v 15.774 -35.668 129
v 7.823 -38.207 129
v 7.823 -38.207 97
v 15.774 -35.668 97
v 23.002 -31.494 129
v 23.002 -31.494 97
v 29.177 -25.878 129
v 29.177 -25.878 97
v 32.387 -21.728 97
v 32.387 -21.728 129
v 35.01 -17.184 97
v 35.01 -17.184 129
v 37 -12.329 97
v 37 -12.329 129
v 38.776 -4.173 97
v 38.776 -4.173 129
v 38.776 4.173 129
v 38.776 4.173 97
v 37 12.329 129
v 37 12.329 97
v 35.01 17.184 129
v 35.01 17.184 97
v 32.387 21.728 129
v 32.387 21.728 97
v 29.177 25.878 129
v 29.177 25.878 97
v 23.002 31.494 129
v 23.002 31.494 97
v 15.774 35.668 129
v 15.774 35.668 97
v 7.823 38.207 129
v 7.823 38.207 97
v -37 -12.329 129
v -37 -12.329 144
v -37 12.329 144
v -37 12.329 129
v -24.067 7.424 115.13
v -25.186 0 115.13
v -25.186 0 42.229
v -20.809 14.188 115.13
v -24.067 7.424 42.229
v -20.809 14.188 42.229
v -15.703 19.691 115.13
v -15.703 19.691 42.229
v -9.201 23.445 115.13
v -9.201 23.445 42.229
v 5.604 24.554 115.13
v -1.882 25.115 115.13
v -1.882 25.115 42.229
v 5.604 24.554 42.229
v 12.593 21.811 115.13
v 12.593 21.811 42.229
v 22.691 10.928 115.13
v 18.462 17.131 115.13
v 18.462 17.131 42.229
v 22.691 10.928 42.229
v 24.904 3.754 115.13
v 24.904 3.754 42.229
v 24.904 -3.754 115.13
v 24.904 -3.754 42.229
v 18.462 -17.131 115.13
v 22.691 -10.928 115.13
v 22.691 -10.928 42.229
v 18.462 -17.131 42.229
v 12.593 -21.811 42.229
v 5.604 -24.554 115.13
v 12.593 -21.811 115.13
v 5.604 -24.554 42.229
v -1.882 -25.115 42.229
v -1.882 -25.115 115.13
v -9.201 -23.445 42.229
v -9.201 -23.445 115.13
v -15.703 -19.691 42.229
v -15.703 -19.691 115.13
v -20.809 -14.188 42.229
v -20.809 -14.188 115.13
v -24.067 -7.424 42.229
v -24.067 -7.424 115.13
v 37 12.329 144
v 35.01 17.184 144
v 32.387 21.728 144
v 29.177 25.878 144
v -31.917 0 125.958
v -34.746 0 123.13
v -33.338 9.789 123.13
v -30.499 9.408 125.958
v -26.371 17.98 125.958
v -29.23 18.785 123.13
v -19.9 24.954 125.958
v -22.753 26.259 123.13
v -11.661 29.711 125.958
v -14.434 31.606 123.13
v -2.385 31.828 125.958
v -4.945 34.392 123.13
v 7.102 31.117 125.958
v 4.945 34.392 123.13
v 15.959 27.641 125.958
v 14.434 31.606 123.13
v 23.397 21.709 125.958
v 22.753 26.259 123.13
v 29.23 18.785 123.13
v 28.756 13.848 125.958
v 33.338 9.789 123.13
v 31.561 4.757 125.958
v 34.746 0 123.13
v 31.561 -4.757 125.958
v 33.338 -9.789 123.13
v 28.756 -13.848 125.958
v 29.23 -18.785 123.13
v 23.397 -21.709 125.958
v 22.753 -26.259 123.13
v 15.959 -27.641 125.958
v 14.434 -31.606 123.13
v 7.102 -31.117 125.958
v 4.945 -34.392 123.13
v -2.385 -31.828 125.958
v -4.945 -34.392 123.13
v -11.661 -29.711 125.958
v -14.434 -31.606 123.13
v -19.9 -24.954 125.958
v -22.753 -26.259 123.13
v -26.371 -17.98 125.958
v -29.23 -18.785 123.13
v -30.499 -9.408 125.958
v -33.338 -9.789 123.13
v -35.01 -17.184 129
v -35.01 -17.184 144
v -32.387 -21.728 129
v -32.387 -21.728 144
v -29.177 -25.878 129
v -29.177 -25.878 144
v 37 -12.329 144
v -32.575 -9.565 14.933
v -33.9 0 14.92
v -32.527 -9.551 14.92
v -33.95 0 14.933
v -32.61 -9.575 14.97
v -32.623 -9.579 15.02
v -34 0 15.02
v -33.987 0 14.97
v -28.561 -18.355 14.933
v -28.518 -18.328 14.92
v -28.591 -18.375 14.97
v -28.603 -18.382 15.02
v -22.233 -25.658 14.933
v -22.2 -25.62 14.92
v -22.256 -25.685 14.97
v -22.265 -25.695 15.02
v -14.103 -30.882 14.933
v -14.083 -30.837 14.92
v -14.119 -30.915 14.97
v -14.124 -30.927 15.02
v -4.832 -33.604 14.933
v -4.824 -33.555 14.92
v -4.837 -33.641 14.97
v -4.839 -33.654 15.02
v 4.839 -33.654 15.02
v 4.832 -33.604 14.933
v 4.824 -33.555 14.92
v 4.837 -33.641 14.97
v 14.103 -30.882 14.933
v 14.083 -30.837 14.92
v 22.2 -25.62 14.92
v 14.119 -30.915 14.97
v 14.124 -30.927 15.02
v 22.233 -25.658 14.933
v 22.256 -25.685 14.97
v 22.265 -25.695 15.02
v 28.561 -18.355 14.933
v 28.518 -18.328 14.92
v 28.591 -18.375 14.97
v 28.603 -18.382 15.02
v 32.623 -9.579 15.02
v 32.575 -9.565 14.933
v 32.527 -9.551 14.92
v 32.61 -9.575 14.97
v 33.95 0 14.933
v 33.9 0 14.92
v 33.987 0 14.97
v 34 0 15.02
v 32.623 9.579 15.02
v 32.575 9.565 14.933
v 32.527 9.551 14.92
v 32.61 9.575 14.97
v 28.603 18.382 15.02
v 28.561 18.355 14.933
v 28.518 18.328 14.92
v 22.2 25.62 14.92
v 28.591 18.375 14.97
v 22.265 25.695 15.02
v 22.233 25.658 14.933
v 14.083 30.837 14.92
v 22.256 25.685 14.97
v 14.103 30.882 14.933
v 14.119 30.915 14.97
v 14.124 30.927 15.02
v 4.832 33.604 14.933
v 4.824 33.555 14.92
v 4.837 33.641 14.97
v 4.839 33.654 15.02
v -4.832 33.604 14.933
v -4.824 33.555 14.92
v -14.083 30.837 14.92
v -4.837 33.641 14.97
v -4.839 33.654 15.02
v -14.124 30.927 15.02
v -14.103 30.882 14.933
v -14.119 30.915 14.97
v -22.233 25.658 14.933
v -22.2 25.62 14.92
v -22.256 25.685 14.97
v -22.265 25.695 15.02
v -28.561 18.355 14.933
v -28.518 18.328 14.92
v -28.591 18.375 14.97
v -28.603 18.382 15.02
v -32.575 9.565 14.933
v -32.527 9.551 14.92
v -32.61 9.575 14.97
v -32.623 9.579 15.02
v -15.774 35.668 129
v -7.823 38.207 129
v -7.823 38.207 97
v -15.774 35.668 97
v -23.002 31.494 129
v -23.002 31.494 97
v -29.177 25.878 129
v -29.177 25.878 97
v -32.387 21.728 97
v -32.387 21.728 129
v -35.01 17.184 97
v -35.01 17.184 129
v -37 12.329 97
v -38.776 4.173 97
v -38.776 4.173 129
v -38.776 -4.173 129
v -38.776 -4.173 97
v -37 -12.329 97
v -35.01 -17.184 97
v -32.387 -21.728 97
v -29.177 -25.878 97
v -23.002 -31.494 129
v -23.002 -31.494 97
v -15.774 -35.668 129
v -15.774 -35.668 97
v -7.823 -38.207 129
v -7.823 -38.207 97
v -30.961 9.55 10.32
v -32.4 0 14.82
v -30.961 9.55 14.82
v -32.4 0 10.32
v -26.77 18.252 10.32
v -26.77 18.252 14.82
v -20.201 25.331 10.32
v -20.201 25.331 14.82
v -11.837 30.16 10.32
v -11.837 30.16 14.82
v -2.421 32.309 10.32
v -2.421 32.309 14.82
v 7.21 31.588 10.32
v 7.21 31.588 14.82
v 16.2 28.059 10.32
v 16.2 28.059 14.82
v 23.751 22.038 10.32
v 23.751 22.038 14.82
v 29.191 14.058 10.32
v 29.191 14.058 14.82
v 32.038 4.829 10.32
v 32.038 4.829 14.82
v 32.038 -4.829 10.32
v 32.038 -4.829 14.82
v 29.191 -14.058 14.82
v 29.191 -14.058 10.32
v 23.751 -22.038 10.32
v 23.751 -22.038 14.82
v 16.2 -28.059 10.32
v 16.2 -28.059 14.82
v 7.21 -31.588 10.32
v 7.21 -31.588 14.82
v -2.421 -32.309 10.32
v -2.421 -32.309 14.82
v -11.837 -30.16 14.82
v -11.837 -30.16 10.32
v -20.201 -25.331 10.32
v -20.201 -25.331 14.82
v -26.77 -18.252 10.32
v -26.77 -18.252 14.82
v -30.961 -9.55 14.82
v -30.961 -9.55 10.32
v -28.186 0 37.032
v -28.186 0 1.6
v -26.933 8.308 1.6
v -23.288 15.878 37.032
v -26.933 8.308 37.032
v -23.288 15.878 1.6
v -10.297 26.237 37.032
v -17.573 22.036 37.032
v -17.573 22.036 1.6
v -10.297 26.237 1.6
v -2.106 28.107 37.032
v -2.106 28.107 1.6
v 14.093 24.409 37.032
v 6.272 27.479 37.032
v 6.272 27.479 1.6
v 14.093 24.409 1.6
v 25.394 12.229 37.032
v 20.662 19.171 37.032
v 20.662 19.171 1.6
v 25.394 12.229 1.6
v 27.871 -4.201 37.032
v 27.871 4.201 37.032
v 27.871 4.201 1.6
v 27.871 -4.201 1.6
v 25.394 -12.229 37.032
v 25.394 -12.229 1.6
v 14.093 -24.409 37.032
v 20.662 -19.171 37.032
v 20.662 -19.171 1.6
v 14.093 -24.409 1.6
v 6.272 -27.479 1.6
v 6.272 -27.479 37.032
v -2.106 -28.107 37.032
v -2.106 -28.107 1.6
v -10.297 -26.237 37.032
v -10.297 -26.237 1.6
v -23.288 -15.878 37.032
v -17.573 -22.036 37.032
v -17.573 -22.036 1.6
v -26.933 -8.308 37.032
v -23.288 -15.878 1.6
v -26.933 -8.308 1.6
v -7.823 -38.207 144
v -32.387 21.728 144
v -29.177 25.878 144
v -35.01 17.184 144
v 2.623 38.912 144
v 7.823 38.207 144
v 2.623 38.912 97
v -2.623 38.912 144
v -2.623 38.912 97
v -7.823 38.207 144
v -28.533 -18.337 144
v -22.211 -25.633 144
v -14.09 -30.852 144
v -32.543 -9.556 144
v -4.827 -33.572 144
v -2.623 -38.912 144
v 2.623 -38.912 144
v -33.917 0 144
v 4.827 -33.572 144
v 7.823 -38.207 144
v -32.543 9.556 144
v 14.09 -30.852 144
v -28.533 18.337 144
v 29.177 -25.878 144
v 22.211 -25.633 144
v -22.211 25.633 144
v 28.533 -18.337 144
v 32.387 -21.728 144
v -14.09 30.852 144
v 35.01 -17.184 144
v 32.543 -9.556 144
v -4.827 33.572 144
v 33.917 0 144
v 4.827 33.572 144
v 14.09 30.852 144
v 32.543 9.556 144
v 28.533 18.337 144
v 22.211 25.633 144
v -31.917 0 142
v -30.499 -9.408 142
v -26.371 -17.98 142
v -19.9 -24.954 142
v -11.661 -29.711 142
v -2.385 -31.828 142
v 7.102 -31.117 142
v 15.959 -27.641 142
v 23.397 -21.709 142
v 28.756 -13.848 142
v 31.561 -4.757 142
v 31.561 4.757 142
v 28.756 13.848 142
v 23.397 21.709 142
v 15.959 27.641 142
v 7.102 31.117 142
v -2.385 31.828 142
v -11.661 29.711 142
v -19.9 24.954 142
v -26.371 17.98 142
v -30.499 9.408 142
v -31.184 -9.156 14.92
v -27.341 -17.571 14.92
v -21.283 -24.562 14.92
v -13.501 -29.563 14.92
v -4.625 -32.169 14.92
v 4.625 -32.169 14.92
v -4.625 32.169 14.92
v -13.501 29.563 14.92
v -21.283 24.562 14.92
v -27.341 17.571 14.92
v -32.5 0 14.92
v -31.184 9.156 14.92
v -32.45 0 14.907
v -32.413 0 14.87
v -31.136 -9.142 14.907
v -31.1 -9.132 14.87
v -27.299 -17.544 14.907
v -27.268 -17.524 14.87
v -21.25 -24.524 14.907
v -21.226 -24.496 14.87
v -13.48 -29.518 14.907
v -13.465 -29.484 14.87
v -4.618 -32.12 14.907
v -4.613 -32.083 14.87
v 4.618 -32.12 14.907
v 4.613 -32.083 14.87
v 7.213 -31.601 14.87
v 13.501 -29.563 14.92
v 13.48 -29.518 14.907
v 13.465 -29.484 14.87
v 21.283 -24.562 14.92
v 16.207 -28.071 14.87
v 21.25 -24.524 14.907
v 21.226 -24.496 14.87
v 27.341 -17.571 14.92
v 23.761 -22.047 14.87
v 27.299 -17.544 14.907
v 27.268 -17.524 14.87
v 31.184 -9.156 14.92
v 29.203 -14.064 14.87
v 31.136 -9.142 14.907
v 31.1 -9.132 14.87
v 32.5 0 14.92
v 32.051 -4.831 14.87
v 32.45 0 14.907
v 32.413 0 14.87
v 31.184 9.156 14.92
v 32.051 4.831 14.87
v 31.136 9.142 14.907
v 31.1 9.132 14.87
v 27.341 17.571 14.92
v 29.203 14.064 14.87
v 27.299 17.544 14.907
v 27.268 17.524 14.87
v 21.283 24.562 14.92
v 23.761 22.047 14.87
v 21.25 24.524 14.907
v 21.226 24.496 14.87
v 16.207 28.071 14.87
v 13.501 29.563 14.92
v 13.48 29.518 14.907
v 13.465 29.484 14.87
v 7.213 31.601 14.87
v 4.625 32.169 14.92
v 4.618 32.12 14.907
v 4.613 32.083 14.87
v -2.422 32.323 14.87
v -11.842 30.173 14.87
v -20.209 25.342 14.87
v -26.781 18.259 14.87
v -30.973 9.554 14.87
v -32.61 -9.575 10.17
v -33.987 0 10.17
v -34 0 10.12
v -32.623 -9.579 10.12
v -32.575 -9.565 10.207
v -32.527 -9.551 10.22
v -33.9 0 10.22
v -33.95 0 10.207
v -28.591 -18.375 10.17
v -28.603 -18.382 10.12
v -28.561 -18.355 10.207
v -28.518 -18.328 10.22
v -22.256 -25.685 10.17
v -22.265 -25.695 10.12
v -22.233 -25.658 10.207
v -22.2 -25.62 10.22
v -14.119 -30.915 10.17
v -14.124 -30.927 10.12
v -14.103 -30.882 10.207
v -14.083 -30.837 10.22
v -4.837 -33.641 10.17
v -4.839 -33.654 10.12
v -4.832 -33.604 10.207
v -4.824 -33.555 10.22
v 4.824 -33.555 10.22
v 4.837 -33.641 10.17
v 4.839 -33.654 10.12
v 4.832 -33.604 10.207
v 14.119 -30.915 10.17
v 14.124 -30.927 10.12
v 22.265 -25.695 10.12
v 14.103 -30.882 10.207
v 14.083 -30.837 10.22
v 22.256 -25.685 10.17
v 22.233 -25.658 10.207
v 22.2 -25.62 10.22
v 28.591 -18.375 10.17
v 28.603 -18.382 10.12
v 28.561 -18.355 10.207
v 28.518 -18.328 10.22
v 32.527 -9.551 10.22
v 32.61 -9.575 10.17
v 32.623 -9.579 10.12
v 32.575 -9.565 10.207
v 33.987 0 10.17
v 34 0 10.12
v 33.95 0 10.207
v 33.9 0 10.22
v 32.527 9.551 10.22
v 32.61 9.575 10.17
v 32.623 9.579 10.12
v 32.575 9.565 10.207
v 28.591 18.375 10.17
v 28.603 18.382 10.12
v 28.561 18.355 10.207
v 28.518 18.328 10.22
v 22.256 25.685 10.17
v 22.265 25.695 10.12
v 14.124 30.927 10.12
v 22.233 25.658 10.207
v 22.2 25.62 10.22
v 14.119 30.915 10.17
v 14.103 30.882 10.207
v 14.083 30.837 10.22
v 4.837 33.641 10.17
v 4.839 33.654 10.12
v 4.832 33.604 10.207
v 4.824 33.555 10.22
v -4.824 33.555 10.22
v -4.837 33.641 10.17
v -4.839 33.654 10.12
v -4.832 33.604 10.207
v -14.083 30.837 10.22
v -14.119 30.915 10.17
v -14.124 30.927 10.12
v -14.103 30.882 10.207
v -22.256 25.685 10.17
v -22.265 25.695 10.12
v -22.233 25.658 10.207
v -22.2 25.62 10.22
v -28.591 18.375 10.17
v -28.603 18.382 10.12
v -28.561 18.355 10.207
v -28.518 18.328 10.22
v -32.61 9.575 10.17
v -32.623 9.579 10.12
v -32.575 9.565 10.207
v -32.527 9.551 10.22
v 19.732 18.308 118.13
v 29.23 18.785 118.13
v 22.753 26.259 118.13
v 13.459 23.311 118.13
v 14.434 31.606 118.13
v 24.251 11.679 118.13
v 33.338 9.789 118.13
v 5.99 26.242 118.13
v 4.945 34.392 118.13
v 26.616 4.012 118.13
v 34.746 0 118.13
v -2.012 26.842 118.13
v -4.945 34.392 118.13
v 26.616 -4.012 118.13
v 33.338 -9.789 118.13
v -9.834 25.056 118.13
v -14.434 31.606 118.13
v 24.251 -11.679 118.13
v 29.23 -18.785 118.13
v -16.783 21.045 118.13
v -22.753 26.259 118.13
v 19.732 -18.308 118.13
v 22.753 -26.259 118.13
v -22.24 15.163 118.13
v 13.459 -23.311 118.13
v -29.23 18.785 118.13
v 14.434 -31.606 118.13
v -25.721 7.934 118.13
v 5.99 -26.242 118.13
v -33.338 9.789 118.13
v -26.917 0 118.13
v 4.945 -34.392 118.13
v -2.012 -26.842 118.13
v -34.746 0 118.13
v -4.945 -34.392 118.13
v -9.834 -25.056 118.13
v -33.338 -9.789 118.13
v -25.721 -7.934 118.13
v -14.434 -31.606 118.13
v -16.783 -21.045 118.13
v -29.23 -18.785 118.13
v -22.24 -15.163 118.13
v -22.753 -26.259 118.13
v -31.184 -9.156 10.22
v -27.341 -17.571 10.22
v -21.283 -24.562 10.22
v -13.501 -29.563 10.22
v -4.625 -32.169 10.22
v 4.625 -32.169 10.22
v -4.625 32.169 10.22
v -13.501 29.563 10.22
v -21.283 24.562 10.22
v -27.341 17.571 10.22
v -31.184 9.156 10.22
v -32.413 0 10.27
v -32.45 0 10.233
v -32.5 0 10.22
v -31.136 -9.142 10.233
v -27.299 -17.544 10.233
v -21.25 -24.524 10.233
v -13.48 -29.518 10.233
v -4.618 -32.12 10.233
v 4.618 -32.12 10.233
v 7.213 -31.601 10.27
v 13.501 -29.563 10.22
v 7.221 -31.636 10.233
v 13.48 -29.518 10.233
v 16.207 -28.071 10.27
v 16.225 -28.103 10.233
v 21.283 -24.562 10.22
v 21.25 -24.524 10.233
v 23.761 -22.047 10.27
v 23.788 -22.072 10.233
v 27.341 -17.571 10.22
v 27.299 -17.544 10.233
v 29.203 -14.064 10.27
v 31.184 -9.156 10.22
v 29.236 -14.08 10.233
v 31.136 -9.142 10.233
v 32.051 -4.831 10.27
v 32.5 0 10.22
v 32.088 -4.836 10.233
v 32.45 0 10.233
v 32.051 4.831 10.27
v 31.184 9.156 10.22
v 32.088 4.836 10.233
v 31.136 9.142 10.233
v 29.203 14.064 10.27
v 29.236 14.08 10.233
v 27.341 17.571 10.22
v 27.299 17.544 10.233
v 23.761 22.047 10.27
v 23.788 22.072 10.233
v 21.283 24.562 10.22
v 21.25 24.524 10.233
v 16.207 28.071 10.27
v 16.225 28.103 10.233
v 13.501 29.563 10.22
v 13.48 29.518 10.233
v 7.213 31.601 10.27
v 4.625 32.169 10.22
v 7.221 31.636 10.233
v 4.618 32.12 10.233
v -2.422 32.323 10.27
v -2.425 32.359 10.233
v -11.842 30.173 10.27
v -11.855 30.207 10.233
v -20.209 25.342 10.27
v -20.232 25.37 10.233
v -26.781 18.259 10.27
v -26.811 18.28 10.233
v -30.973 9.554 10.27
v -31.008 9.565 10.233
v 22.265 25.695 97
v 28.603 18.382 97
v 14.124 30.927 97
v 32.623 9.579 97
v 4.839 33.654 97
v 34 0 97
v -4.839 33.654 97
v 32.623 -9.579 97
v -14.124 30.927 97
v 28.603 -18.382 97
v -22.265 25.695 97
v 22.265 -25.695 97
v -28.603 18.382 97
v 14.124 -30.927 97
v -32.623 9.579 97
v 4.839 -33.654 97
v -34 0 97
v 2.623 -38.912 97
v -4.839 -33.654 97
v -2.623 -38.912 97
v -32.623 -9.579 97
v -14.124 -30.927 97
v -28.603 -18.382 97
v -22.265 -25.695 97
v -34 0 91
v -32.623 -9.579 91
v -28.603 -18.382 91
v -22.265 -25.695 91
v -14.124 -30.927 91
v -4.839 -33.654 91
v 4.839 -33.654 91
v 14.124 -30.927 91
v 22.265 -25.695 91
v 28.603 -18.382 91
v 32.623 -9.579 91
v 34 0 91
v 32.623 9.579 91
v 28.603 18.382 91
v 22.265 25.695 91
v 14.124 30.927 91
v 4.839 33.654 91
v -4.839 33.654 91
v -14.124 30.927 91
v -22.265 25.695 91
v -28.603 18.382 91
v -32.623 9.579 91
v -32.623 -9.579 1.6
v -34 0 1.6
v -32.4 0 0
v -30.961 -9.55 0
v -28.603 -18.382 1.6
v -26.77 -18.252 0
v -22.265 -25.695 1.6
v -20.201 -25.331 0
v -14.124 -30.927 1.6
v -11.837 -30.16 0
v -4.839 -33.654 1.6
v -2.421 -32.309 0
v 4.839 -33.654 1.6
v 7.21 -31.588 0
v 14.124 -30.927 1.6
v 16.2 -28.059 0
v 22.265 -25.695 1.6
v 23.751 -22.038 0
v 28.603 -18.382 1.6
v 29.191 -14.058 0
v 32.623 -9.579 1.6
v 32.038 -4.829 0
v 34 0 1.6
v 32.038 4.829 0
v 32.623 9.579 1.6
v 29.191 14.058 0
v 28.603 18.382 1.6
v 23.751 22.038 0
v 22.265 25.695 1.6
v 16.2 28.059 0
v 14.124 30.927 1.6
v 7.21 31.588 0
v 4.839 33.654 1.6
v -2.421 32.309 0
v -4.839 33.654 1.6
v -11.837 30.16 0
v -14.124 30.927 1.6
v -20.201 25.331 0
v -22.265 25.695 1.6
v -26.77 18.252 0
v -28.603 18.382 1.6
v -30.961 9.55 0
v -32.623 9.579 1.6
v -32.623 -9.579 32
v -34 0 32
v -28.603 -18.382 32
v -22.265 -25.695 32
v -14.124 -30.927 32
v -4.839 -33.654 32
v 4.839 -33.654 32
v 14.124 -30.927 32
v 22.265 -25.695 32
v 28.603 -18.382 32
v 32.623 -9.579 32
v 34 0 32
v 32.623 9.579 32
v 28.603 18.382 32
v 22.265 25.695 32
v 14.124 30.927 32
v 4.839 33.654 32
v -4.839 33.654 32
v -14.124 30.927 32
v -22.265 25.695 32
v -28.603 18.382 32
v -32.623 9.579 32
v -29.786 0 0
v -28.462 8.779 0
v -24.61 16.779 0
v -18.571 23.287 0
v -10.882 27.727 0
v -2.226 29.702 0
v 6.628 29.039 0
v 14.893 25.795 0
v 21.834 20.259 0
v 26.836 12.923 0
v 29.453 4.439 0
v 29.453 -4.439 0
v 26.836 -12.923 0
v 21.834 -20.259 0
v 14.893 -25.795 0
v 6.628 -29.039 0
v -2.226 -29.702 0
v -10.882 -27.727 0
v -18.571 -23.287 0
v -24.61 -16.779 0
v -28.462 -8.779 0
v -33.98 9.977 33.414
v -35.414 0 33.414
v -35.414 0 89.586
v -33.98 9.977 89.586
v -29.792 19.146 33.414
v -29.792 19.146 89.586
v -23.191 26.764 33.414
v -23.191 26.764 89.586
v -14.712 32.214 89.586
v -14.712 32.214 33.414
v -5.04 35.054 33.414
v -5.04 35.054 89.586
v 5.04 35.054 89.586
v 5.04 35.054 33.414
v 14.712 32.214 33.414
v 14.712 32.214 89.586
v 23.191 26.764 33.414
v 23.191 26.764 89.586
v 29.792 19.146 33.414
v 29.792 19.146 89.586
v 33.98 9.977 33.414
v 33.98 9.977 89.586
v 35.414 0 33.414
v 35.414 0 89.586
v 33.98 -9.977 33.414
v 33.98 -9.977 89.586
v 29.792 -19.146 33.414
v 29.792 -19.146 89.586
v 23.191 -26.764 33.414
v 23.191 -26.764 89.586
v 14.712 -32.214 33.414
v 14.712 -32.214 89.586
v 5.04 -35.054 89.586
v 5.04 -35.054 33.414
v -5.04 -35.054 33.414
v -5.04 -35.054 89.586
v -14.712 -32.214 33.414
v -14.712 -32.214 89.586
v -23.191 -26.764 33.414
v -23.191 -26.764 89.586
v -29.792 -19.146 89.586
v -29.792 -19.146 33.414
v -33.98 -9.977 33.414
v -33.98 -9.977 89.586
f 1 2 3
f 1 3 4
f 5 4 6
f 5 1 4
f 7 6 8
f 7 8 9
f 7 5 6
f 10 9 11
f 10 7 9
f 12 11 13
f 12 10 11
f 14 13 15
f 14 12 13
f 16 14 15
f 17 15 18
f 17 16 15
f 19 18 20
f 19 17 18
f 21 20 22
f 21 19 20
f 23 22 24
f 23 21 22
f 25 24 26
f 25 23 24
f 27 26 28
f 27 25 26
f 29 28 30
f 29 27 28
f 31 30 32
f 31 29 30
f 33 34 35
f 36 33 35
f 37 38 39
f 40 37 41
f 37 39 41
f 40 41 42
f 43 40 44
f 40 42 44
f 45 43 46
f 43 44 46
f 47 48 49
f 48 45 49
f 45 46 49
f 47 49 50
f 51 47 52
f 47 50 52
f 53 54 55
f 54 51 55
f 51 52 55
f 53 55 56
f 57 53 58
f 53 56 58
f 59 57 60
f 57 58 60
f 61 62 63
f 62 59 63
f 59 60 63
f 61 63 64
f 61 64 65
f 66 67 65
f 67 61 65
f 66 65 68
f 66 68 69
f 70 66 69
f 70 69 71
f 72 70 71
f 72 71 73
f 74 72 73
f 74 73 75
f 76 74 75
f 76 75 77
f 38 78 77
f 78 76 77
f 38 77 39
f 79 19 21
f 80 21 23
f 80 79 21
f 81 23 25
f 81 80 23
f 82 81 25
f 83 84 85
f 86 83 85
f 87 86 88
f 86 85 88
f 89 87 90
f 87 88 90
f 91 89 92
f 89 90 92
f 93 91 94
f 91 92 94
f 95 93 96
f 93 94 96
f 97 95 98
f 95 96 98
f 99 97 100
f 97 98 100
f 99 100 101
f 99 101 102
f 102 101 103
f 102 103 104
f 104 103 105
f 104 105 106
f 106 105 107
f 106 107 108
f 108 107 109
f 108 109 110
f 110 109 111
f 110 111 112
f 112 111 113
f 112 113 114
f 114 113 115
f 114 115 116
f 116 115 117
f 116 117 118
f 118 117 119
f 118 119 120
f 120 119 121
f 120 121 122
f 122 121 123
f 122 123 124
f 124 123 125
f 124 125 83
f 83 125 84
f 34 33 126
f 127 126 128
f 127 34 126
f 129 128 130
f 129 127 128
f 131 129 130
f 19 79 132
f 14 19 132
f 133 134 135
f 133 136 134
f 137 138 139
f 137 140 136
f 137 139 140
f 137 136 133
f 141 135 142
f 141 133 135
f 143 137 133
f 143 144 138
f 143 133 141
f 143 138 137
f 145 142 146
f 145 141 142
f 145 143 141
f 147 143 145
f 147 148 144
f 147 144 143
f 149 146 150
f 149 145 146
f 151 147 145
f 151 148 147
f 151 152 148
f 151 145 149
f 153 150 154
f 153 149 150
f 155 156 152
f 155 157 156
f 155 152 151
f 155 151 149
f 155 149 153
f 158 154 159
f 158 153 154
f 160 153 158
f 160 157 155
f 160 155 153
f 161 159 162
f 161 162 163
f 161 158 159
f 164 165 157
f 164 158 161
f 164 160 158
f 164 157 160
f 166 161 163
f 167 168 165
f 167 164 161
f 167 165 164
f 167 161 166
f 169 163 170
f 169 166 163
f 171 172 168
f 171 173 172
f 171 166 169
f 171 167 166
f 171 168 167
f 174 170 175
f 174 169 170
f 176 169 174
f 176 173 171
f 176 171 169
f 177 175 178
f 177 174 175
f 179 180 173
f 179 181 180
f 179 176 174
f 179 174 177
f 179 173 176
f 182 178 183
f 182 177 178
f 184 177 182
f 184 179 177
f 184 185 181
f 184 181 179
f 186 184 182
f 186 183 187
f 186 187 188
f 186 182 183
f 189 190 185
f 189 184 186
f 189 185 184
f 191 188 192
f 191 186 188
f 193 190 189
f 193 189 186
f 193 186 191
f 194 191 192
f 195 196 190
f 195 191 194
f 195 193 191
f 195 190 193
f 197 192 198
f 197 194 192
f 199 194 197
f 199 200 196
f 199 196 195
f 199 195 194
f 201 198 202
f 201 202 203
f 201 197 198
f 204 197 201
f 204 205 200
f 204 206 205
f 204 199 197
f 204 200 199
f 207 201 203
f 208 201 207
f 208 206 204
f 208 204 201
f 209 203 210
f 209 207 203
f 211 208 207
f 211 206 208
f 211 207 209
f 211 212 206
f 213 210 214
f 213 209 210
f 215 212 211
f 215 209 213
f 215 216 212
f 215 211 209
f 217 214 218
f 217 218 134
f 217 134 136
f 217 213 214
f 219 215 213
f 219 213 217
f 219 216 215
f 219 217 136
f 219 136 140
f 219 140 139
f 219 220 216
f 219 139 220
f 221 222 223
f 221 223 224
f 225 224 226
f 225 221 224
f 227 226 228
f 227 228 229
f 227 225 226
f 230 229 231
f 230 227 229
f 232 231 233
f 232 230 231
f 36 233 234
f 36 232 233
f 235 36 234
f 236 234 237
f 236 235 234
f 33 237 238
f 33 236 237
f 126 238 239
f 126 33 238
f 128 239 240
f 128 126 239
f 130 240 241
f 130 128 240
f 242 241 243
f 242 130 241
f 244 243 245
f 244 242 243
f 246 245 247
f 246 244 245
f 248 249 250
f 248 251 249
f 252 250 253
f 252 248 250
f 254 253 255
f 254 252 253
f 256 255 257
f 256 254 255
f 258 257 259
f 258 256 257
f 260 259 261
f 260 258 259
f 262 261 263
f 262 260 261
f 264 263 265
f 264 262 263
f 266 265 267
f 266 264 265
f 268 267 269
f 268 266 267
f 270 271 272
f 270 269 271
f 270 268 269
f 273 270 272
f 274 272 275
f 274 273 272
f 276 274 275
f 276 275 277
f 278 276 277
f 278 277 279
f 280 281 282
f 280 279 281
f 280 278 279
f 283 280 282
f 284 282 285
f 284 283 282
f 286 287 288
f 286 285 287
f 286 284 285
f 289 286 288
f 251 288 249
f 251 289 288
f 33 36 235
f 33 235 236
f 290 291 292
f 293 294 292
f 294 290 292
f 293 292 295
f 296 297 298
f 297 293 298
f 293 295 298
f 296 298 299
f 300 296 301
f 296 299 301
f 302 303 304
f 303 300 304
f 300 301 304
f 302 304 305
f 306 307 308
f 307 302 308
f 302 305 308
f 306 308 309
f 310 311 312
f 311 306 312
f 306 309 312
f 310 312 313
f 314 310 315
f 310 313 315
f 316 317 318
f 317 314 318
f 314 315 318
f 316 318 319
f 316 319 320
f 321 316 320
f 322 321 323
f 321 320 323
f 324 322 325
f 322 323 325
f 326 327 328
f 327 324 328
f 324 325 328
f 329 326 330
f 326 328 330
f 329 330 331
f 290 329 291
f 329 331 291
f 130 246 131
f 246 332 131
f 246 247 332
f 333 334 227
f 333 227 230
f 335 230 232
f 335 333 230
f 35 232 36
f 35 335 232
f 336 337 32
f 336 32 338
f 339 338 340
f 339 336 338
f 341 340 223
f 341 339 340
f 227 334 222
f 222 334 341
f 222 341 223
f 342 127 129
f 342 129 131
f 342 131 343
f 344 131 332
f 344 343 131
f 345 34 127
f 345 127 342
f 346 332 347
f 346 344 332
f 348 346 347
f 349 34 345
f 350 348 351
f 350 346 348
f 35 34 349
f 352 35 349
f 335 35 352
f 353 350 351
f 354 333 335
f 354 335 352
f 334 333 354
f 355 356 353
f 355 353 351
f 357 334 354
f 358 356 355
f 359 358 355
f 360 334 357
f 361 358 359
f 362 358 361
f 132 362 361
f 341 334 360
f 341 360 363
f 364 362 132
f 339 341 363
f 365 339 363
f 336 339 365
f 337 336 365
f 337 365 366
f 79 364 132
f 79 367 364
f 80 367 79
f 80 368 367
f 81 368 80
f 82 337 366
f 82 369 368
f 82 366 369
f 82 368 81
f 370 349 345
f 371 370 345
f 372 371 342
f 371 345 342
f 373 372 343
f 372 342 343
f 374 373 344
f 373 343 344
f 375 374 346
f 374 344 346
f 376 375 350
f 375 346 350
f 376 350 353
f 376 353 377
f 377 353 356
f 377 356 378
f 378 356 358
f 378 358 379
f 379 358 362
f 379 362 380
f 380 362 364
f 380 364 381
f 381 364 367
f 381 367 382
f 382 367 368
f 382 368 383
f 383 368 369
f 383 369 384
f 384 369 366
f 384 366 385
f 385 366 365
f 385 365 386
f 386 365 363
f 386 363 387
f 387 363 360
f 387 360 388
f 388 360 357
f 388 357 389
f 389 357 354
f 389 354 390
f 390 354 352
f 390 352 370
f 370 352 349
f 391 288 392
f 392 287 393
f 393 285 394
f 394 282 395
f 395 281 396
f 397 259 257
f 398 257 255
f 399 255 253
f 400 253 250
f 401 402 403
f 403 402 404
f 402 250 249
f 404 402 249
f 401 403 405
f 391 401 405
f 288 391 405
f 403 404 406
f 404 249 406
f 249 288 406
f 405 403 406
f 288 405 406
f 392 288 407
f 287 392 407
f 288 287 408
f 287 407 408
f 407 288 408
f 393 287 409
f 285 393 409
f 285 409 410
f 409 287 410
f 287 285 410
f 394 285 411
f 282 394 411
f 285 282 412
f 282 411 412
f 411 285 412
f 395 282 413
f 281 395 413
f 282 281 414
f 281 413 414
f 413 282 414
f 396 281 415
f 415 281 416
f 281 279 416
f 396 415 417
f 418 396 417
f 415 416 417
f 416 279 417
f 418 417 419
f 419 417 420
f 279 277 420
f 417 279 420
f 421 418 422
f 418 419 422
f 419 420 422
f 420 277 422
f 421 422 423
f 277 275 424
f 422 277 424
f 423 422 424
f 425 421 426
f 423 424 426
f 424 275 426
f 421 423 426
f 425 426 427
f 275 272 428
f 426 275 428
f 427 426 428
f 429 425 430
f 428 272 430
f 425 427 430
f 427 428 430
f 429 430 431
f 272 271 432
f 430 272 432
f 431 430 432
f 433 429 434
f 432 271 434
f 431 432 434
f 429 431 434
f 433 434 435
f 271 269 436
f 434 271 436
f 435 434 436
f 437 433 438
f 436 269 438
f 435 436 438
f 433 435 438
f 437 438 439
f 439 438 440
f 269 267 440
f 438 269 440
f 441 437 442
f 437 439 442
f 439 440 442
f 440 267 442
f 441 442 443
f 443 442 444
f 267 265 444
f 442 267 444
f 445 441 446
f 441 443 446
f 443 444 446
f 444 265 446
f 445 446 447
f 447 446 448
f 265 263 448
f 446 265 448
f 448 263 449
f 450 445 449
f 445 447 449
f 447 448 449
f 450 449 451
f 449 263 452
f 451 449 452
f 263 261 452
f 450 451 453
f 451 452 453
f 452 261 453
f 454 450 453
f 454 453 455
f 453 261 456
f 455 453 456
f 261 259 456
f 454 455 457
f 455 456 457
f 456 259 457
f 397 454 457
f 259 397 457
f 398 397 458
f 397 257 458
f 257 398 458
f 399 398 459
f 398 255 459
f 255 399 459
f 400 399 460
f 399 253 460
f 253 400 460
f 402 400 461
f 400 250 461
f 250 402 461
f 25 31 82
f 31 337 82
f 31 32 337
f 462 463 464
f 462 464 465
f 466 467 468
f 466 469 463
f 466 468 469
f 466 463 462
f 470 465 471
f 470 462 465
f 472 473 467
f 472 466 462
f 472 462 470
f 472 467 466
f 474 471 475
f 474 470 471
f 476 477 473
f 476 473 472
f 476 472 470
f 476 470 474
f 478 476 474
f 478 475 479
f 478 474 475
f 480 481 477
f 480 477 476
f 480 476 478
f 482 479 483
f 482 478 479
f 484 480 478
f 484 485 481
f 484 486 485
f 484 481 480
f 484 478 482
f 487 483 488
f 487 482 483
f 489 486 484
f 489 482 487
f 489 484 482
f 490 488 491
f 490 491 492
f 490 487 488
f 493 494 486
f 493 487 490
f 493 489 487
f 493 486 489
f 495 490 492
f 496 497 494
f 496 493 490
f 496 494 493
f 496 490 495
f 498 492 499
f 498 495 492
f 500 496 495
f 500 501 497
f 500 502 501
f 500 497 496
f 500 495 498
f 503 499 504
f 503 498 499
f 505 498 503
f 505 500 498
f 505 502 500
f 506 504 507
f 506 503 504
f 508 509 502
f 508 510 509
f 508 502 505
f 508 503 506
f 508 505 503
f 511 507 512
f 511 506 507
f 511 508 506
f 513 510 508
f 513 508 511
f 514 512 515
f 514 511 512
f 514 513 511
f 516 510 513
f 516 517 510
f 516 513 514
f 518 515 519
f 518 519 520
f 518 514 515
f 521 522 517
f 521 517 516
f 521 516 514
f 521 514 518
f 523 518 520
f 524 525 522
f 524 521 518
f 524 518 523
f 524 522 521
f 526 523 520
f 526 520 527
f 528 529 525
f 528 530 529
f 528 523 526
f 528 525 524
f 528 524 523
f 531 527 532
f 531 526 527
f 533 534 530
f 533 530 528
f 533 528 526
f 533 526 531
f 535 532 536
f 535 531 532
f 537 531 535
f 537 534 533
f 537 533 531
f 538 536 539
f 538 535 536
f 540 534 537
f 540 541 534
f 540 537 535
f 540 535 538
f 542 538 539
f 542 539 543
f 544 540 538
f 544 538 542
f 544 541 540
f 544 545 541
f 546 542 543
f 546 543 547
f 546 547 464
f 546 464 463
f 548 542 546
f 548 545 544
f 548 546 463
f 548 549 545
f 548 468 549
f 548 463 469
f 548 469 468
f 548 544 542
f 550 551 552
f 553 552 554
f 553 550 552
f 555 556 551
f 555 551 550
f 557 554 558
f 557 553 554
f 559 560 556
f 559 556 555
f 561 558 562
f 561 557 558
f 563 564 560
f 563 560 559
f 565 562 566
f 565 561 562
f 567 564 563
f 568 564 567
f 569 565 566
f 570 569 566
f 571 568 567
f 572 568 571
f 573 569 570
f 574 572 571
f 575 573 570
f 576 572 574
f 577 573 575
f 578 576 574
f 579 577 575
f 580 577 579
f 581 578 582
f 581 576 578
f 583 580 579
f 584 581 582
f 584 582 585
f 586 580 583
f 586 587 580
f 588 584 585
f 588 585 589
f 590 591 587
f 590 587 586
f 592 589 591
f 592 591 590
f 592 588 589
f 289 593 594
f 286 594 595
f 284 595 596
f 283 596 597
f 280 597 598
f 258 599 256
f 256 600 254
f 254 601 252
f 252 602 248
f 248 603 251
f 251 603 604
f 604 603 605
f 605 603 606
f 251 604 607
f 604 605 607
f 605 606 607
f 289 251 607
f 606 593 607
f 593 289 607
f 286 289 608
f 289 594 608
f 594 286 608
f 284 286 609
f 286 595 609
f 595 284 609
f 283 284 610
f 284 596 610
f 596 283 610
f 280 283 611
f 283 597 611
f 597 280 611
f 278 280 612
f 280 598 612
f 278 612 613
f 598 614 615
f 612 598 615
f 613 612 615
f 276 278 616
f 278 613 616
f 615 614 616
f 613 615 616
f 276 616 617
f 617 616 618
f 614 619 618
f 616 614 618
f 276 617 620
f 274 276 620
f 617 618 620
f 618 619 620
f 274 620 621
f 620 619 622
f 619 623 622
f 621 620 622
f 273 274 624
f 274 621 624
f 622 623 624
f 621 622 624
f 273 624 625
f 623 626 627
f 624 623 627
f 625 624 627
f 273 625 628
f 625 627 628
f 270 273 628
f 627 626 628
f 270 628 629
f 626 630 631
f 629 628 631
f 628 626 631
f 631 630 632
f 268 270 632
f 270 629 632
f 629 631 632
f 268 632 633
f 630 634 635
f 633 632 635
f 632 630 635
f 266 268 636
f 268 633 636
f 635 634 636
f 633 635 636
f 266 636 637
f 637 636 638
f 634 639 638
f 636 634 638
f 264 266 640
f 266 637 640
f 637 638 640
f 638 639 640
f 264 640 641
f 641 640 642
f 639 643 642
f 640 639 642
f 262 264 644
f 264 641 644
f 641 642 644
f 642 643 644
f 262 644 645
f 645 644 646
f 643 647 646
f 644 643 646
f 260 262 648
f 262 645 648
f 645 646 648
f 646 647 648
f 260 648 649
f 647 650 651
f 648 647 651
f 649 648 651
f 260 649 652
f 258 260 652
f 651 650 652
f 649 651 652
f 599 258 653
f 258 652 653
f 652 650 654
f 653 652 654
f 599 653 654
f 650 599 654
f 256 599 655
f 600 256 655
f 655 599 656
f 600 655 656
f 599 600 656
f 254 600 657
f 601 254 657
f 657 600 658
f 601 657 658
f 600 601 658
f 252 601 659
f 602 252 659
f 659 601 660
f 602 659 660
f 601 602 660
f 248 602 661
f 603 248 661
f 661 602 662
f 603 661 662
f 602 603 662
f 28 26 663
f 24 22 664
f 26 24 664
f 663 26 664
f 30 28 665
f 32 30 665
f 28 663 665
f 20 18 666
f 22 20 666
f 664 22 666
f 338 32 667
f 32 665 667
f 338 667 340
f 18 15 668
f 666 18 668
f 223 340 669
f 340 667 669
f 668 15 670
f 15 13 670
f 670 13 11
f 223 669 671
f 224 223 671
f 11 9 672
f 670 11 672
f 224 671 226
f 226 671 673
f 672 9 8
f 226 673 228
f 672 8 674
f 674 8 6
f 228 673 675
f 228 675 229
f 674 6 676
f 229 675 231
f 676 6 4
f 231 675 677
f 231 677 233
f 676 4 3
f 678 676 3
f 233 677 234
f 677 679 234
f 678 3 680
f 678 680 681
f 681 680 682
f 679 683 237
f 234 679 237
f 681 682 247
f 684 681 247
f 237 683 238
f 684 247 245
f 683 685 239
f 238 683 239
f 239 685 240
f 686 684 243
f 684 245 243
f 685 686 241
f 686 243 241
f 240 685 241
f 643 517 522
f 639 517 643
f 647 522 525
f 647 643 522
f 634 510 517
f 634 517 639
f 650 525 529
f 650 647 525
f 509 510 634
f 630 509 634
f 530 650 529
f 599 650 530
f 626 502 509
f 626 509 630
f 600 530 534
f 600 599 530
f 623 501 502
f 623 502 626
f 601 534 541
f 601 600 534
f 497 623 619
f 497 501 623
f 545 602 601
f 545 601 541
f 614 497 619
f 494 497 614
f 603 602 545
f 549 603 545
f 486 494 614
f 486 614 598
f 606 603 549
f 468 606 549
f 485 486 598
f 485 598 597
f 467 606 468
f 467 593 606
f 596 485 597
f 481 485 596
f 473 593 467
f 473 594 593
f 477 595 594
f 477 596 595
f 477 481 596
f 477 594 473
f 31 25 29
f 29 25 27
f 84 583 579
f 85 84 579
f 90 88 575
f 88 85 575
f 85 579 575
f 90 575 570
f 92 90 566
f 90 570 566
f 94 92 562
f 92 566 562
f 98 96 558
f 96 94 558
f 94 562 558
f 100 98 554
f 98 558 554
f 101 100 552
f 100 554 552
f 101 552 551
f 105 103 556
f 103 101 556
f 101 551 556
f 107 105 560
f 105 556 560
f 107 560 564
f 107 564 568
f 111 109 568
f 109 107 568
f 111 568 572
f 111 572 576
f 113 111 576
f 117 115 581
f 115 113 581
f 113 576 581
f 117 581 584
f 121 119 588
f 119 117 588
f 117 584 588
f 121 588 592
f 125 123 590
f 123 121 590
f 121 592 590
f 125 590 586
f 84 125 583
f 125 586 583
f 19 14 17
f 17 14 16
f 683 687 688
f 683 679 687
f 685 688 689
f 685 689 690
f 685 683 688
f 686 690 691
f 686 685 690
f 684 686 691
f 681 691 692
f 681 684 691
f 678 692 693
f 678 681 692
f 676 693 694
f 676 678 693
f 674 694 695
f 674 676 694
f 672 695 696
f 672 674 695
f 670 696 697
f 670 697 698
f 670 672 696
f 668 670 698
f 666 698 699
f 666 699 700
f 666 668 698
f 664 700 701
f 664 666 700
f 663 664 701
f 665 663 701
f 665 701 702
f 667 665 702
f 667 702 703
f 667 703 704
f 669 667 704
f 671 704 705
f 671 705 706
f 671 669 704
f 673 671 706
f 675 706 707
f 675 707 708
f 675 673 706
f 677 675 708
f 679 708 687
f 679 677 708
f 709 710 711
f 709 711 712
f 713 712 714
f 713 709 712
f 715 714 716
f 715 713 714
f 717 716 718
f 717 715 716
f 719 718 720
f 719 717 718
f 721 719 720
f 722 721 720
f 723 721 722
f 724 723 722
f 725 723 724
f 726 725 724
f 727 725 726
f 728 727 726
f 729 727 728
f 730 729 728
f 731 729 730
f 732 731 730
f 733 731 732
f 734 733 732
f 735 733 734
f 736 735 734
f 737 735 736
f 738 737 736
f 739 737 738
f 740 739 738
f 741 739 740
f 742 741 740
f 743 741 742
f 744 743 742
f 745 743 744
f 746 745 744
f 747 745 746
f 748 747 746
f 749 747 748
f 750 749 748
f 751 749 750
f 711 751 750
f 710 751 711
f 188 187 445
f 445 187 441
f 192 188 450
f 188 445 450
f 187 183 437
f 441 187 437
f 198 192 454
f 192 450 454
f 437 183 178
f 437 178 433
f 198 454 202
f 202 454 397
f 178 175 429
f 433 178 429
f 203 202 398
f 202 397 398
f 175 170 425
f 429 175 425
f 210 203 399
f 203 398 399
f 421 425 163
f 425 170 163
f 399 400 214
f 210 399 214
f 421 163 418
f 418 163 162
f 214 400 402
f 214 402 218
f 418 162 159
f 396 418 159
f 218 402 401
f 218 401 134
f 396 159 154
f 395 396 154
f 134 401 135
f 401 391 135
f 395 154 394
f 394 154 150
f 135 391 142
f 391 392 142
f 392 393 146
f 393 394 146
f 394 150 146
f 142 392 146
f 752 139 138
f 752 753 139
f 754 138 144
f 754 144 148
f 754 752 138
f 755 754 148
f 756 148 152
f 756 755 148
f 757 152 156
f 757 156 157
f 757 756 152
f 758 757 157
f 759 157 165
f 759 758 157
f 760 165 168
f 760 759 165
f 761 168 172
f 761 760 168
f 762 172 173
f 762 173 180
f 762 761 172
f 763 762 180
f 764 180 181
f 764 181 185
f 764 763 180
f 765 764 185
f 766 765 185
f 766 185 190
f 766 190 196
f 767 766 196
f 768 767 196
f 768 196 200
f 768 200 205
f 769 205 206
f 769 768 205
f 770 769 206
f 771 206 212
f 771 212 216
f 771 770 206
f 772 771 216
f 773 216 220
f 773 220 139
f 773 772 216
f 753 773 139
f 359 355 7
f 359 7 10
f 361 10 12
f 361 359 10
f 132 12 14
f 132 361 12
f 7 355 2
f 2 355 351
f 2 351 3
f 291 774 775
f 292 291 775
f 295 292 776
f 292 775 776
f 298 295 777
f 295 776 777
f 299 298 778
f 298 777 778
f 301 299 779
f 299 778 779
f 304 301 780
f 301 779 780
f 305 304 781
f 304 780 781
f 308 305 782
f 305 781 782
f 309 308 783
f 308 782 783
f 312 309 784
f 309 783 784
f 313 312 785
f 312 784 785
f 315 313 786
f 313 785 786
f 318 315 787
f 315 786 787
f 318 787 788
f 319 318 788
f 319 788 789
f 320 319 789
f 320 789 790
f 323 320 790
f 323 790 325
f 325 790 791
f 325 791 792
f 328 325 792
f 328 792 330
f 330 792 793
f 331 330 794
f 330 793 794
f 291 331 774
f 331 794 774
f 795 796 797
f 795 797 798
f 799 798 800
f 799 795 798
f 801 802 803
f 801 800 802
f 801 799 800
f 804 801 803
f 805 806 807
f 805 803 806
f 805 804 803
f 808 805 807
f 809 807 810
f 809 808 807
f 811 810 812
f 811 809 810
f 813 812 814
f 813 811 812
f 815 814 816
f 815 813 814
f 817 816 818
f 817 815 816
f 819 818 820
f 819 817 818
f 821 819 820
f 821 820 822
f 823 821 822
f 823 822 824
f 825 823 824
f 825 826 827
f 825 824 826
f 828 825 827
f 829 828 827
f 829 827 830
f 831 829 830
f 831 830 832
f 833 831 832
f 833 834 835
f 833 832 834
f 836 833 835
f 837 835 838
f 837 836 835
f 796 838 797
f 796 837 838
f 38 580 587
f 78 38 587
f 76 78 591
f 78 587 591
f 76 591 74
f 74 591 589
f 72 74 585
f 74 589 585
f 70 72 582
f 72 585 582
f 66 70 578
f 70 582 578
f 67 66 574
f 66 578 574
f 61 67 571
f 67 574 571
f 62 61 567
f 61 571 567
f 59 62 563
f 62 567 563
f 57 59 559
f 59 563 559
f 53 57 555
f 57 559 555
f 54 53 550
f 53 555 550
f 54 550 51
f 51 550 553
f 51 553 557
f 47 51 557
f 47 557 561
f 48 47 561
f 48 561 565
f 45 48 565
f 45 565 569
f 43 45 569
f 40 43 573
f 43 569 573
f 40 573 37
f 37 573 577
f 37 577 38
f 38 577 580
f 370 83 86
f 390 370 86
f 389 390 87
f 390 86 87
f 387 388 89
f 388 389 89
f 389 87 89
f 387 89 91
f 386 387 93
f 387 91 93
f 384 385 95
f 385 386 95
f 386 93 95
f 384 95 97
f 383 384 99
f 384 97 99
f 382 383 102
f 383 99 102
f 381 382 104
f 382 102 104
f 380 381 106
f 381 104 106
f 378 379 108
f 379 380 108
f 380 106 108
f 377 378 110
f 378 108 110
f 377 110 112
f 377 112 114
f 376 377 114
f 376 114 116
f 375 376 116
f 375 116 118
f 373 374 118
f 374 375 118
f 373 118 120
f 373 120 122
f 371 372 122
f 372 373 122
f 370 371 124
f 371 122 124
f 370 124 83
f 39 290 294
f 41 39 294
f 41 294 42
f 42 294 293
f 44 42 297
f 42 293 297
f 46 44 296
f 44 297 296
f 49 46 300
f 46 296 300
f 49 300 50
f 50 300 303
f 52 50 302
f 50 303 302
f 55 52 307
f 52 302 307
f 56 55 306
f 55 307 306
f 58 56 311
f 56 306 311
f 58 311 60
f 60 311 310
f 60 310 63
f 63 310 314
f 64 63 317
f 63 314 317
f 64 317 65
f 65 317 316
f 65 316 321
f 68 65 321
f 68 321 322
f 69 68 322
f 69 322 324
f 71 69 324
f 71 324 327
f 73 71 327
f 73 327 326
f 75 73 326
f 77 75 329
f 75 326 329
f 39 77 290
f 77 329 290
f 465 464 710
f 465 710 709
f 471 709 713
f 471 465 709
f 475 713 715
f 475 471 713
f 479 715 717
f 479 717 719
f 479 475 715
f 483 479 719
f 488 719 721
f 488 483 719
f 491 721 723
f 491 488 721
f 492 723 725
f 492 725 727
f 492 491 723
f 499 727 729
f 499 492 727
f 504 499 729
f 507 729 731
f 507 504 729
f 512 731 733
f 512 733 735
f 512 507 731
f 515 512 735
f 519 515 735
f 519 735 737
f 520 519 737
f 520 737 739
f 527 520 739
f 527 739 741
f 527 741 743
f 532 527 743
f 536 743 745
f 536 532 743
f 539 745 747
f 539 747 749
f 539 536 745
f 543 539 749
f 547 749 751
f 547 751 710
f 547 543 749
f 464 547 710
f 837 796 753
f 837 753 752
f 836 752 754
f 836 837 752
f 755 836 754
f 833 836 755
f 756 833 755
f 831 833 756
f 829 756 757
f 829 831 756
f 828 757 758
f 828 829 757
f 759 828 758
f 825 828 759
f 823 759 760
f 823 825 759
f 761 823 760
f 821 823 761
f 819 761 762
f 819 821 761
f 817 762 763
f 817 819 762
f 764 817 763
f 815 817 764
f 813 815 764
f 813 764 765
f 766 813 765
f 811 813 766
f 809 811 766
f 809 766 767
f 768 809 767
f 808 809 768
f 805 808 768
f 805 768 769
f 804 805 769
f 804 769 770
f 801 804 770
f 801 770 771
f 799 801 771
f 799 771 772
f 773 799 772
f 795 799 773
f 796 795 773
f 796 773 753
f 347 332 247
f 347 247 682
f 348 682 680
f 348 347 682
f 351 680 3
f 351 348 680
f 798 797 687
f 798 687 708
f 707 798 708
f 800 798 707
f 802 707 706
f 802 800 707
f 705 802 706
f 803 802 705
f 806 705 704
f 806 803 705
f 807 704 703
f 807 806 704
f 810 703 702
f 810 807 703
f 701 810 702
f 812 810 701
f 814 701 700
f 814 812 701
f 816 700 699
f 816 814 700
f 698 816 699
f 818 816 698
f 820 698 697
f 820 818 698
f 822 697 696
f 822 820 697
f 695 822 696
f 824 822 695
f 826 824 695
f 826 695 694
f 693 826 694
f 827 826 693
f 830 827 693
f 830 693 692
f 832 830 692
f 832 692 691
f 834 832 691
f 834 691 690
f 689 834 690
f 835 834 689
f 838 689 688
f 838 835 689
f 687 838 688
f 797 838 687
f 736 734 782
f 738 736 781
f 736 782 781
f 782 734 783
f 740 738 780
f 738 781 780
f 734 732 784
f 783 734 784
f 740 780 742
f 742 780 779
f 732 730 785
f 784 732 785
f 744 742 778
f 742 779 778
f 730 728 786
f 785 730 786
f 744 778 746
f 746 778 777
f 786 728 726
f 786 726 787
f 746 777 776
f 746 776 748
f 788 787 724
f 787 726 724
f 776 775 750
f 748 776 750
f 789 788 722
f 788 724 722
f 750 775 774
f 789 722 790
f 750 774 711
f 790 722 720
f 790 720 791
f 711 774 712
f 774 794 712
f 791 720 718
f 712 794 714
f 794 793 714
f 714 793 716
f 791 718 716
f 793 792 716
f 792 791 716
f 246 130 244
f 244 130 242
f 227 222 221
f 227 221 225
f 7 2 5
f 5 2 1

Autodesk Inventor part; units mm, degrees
ref_plane "YZ Plane" through (0, 0, 0) normal (1, 0, 0) x (0, 1, 0)
ref_plane "XZ Plane" through (0, 0, 0) normal (0, 1, 0) x (-1, 0, 0)
ref_plane "XY Plane" through (0, 0, 0) normal (0, 0, 1) x (1, 0, 0)
sketch "Sketch1" plane through (0, 0, 0) normal (0, 1, 0) x (-1, 0, 0)
  line L0 (34, 0) -> (64.4, 0) construction
  line L1 (34, 32) -> (36, 32) construction
  line L2 (34, 91) -> (34, 97)
  line L3 (34, 97) -> (34, 91)
  line L4 (34, 91) -> (35.4142, 89.5858)
  line L5 (35.4142, 89.5858) -> (35.4142, 89.5858)
  line L6 (35.4142, 89.5858) -> (35.4142, 33.4142)
  line L7 (34, 97) -> (39, 97)
  line L8 (34, 97) -> (39, 97) construction
  line L9 (39, 97) -> (39, 129)
  line L10 (39, 129) -> (36, 129)
  line L11 (36, 129) -> (36, 144)
  line L12 (33.9171, 144) -> (36, 144)
  line L13 (31.9171, 142) -> (31.9171, 125.958)
  line L14 (31.9171, 144) -> (47.9592, 144) construction
  line L15 (31.9171, 125.958) -> (34.7455, 123.1296)
  line L16 (31.9171, 125.958) -> (35.9171, 125.958) construction
  line L17 (34.7455, 123.1296) -> (34.7455, 118.1296)
  line L18 (34.7455, 118.1296) -> (26.9171, 118.1296)
  line L19 (26.9171, 118.1296) -> (25.1856, 115.1305)
  line L20 (26.9171, 118.1296) -> (30.3802, 118.1296) construction
  line L21 (25.1856, 42.2286) -> (28.1856, 37.0325)
  line L22 (25.1856, 42.2286) -> (31.1856, 42.2286) construction
  line L23 (28.1856, 37.0325) -> (28.1856, 1.6)
  line L24 (32.4, 0) -> (29.7856, 0)
  line L25 (28.1856, 1.6) -> (29.7856, 0)
  line L26 (34, 1.6) -> (32.4, 0)
  line L27 (33.9171, 144) -> (31.9171, 142)
  line L28 (33.9, 14.92) -> (32.5, 14.92)
  line L29 (32.4, 14.82) -> (32.4, 10.32)
  line L30 (32.5, 10.22) -> (33.9, 10.22)
  line L31 (34, 1.6) -> (34, 10.12)
  arc A0 (32.5, 14.92) -> (32.4, 14.82) centre (32.5, 14.82) ccw
  arc A1 (32.4, 10.32) -> (32.5, 10.22) centre (32.5, 10.32) ccw
  arc A2 (33.9, 14.92) -> (34, 15.02) centre (33.9, 15.02) ccw
  arc A3 (34, 10.12) -> (33.9, 10.22) centre (33.9, 10.12) ccw
  line L32 (34, 15.02) -> (34, 32)
  line L33 (34, 32) -> (35.4142, 33.4142)
  line L34 (25.1856, 115.1305) -> (25.1856, 42.2286)
  line L35 (0, -28.8) -> (0, 172.8001) projected
  point P0 (0, 0)
  point P1 (28.1856, 0)
  point P2 (32.4, 14.92)
  point P3 (32.4, 10.22)
  dimension "d2" = 32
  dimension "d4" = 2
  dimension "d8" = 65
  dimension "d12" = 5
  dimension "d14" = 32
  dimension "d16" = 90
  dimension "d18" = 90
  dimension "d22" = 90
  dimension "d23" = 4
  dimension "d24" = 45
  dimension "d25" = 5
  dimension "d26" = 135
  dimension "d28" = 120
  dimension "d30" = 6
  dimension "d31" = 60
  dimension "d32" = 150
  dimension "d33" = 1.6
  dimension "d34" = 1.6
  dimension "d35" = 1.6
  dimension "d36" = 1.6
  dimension "d37" = 2
  dimension "d38" = 2
  dimension "d39" = 4.7
  dimension "d41" = 90
  dimension "d42" = 0.1
revolve "Revolution1" add sketch "Sketch1" angle 360 about axis through (0, 0, -10) along (0, 0, 1)
thread "Thread1" size "M72x3" class "6g" standard "ANSI Metric M Profile" full length
thread "Thread2" size "M64x2" class "6H" standard "ANSI Metric M Profile" full length
sketch "Sketch2" plane through (0, 0, 144) normal (0, 0, 1) x (1, 0, 0)
  line L0 (29.1771, -25.8785) -> (7.8229, -38.2074)
  line L1 (-7.8229, -38.2074) -> (-29.1771, -25.8785)
  line L2 (-37, -12.3288) -> (-37, 12.3288)
  line L3 (-29.1771, 25.8785) -> (-7.8229, 38.2074)
  line L4 (7.8229, 38.2074) -> (29.1771, 25.8785)
  line L5 (37, 12.3288) -> (37, -12.3288)
  arc A0 (29.1771, -25.8785) -> (37, -12.3288) centre (0, 0) ccw
  arc A1 (37, 12.3288) -> (29.1771, 25.8785) centre (0, 0) ccw
  arc A2 (7.8229, 38.2074) -> (-7.8229, 38.2074) centre (0, 0) ccw
  arc A3 (-29.1771, 25.8785) -> (-37, 12.3288) centre (0, 0) ccw
  arc A4 (-37, -12.3288) -> (-29.1771, -25.8785) centre (0, 0) ccw
  arc A5 (-7.8229, -38.2074) -> (7.8229, -38.2074) centre (0, 0) ccw
  circle A6 centre (0, 0) radius 36
  dimension "d48" = 74
extrude "Extrusion1" add sketch "Sketch2" against normal blind 47
equation "\"d34\" = d33"
equation "\"d35\" = d33"
equation "\"d36\" = d35"
equation "\"d38\" = d37"
properties part number "Переводник"
